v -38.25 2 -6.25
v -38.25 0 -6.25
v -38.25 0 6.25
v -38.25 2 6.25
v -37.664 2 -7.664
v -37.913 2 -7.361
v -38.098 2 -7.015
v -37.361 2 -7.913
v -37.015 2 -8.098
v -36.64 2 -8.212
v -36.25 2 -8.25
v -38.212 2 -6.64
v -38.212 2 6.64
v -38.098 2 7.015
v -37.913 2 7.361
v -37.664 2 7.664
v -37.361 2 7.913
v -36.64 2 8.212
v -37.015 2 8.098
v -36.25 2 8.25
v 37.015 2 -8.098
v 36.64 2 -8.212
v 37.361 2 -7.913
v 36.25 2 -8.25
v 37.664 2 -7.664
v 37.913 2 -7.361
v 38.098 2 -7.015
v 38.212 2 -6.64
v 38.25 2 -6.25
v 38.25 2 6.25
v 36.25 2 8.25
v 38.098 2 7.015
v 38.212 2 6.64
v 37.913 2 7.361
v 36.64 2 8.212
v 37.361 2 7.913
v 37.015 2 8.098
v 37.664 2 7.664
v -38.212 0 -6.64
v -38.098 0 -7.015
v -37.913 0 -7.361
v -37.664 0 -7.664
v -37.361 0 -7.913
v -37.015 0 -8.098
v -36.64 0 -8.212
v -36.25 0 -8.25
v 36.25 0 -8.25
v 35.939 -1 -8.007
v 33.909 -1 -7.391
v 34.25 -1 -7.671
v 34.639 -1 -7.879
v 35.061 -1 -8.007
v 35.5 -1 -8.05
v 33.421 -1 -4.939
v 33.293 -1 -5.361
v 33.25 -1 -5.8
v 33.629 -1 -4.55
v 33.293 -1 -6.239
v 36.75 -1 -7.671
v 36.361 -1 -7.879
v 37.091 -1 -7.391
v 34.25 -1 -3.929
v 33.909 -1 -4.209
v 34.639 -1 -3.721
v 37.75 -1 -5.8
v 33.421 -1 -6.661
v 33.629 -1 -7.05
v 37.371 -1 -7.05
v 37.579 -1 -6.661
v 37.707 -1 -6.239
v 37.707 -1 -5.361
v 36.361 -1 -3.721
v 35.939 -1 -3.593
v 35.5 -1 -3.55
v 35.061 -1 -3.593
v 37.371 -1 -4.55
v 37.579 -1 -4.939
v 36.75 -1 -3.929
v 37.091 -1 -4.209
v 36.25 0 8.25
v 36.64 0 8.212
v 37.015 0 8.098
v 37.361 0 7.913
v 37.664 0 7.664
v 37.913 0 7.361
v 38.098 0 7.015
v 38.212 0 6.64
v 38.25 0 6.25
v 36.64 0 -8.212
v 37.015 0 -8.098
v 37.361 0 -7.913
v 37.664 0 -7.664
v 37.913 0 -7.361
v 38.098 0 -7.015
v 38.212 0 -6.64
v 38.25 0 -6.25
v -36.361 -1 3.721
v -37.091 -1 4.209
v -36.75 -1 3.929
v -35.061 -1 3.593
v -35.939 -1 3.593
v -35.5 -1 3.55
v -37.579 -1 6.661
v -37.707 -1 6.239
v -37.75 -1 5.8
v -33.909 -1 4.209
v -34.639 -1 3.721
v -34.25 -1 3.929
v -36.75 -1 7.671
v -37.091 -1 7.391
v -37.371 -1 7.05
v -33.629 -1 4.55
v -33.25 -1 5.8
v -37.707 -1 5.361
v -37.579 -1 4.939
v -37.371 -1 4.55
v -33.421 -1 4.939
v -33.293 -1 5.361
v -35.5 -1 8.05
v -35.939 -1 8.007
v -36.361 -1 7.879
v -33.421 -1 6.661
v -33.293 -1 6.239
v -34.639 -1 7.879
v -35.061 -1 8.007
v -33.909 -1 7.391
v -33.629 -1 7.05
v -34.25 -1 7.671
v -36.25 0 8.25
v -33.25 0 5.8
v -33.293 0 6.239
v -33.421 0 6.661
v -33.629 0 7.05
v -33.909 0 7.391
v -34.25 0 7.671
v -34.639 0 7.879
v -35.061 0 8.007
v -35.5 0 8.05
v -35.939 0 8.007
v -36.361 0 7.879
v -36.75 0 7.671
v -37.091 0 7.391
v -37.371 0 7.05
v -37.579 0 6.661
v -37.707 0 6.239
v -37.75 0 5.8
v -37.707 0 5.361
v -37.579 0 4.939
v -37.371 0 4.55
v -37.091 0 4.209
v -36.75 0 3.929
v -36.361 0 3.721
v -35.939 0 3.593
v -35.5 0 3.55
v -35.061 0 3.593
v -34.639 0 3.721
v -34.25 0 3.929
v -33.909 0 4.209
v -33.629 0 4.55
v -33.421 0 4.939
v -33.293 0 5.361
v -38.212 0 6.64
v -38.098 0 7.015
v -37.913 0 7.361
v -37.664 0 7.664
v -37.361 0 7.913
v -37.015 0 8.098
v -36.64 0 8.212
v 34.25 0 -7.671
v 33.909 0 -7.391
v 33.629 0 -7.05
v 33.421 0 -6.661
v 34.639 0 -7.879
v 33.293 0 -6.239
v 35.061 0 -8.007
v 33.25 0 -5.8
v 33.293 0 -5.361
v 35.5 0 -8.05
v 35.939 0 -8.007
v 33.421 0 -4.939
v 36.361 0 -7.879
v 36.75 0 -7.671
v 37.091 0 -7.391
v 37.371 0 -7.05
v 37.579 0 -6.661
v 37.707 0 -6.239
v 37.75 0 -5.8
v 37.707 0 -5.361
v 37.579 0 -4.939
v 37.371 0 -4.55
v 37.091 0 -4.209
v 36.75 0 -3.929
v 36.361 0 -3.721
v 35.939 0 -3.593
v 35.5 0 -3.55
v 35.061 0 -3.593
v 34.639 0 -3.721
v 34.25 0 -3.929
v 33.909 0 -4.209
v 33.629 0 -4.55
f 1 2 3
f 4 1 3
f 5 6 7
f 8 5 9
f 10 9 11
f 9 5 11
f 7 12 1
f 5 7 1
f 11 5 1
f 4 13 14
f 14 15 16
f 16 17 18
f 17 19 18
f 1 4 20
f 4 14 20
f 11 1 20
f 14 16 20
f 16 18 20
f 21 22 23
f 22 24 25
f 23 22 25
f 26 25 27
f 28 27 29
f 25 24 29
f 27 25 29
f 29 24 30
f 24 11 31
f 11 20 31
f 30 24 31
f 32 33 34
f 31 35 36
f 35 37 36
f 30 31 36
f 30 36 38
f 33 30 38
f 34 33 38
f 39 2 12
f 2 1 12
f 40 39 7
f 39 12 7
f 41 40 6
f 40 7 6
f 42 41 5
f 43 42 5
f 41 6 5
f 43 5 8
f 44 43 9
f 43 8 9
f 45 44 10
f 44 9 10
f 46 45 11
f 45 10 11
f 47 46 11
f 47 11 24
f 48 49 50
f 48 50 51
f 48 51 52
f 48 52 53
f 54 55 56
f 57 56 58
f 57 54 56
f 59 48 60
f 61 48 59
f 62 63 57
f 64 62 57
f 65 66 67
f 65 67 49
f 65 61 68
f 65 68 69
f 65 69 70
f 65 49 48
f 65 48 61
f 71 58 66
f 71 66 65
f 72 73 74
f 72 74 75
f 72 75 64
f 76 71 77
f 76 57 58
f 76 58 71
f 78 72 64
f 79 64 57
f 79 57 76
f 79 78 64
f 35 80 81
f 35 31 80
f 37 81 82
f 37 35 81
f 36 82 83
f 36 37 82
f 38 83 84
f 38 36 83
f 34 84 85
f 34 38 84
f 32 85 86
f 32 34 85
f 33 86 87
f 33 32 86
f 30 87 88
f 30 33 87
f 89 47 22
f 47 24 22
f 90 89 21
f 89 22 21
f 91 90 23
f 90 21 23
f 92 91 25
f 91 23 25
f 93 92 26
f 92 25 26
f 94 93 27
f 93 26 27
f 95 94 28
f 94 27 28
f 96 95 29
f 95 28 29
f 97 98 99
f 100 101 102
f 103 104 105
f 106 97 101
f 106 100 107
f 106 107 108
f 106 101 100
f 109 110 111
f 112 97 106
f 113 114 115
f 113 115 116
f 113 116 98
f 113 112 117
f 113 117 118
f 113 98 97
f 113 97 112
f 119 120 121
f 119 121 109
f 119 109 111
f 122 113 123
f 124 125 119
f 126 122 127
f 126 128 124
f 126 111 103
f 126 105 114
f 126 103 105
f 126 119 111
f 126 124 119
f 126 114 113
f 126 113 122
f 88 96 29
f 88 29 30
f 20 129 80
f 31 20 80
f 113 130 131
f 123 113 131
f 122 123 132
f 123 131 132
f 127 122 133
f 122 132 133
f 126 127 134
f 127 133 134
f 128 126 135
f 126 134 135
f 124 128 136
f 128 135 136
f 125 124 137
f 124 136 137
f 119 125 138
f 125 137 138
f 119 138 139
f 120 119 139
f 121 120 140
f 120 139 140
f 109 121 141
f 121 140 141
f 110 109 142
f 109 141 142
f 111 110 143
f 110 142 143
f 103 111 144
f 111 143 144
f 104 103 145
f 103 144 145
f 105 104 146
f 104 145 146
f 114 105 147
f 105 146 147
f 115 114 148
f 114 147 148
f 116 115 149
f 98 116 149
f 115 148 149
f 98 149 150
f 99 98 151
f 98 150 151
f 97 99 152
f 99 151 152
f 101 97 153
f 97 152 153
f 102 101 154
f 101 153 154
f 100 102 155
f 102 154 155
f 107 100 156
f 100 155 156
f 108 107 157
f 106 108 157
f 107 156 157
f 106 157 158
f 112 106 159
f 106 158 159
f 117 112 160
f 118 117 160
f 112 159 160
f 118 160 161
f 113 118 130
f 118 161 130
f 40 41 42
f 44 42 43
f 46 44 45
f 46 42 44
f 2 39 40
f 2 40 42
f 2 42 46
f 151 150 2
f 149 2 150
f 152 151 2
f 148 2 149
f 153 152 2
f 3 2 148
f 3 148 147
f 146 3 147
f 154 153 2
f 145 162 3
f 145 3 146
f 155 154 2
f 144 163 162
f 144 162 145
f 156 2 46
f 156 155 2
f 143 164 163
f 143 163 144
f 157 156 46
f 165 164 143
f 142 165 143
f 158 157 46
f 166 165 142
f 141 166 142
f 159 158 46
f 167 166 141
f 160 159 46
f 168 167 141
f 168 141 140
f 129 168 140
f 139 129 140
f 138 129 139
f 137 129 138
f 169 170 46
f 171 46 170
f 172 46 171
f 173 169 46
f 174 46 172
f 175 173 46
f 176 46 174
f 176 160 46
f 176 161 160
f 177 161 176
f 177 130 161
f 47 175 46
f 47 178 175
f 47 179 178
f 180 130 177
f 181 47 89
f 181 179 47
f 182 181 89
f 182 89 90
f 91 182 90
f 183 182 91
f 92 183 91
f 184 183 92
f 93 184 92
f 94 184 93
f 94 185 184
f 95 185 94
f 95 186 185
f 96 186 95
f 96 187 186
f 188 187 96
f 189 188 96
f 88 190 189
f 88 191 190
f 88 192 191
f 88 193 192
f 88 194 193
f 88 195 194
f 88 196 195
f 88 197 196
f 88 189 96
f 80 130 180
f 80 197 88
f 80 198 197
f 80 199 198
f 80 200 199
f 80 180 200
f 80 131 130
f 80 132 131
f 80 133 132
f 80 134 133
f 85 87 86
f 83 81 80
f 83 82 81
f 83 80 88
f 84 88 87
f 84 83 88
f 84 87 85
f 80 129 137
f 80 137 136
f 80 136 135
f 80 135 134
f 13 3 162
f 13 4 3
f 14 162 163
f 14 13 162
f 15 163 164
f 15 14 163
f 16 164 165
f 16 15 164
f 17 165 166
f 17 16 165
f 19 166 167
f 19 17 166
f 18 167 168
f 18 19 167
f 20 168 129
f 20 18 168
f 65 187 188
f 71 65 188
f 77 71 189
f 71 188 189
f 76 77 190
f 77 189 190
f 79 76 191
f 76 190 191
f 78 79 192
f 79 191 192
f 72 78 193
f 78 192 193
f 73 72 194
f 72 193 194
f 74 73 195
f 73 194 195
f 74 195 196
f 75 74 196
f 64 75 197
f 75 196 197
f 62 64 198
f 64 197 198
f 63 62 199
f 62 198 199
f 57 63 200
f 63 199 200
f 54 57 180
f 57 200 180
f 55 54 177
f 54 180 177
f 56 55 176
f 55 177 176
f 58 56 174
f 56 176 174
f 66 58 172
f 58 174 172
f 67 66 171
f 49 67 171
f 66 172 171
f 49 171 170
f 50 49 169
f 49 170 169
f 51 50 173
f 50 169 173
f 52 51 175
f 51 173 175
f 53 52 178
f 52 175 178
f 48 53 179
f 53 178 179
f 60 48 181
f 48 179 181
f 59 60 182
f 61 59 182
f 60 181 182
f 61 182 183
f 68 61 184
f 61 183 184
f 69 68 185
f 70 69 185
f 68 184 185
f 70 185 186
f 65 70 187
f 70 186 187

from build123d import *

# Parameters (mm, degrees)
F0_W     = 76.5
F0_H     = 16.5
F2_DEPTH = 2
F1_R     = 2.25
F3_DEPTH = 1
F4_R     = 2


with BuildPart() as f2:
    # F0 (on Front) → F2 (new body)
    with BuildSketch(Plane.XZ):
        Rectangle(F0_W, F0_H)
    extrude(amount=-F2_DEPTH)

    # F1 (on Front) → F3 (join)
    with BuildSketch(Plane.XZ):
        with Locations((-35.5, 5.8)):
            Circle(F1_R)
        with Locations((35.5, -5.8)):
            Circle(F1_R)
    extrude(amount=F3_DEPTH)

    # F4
    f4_edges = [f2.edges().sort_by_distance(p)[0] for p in [
        (38.25, 1, -8.25),
        (38.25, 1, 8.25),
        (-38.25, 1, -8.25),
        (-38.25, 1, 8.25),
    ]]
    fillet(f4_edges, radius=F4_R)


solid = f2.part
